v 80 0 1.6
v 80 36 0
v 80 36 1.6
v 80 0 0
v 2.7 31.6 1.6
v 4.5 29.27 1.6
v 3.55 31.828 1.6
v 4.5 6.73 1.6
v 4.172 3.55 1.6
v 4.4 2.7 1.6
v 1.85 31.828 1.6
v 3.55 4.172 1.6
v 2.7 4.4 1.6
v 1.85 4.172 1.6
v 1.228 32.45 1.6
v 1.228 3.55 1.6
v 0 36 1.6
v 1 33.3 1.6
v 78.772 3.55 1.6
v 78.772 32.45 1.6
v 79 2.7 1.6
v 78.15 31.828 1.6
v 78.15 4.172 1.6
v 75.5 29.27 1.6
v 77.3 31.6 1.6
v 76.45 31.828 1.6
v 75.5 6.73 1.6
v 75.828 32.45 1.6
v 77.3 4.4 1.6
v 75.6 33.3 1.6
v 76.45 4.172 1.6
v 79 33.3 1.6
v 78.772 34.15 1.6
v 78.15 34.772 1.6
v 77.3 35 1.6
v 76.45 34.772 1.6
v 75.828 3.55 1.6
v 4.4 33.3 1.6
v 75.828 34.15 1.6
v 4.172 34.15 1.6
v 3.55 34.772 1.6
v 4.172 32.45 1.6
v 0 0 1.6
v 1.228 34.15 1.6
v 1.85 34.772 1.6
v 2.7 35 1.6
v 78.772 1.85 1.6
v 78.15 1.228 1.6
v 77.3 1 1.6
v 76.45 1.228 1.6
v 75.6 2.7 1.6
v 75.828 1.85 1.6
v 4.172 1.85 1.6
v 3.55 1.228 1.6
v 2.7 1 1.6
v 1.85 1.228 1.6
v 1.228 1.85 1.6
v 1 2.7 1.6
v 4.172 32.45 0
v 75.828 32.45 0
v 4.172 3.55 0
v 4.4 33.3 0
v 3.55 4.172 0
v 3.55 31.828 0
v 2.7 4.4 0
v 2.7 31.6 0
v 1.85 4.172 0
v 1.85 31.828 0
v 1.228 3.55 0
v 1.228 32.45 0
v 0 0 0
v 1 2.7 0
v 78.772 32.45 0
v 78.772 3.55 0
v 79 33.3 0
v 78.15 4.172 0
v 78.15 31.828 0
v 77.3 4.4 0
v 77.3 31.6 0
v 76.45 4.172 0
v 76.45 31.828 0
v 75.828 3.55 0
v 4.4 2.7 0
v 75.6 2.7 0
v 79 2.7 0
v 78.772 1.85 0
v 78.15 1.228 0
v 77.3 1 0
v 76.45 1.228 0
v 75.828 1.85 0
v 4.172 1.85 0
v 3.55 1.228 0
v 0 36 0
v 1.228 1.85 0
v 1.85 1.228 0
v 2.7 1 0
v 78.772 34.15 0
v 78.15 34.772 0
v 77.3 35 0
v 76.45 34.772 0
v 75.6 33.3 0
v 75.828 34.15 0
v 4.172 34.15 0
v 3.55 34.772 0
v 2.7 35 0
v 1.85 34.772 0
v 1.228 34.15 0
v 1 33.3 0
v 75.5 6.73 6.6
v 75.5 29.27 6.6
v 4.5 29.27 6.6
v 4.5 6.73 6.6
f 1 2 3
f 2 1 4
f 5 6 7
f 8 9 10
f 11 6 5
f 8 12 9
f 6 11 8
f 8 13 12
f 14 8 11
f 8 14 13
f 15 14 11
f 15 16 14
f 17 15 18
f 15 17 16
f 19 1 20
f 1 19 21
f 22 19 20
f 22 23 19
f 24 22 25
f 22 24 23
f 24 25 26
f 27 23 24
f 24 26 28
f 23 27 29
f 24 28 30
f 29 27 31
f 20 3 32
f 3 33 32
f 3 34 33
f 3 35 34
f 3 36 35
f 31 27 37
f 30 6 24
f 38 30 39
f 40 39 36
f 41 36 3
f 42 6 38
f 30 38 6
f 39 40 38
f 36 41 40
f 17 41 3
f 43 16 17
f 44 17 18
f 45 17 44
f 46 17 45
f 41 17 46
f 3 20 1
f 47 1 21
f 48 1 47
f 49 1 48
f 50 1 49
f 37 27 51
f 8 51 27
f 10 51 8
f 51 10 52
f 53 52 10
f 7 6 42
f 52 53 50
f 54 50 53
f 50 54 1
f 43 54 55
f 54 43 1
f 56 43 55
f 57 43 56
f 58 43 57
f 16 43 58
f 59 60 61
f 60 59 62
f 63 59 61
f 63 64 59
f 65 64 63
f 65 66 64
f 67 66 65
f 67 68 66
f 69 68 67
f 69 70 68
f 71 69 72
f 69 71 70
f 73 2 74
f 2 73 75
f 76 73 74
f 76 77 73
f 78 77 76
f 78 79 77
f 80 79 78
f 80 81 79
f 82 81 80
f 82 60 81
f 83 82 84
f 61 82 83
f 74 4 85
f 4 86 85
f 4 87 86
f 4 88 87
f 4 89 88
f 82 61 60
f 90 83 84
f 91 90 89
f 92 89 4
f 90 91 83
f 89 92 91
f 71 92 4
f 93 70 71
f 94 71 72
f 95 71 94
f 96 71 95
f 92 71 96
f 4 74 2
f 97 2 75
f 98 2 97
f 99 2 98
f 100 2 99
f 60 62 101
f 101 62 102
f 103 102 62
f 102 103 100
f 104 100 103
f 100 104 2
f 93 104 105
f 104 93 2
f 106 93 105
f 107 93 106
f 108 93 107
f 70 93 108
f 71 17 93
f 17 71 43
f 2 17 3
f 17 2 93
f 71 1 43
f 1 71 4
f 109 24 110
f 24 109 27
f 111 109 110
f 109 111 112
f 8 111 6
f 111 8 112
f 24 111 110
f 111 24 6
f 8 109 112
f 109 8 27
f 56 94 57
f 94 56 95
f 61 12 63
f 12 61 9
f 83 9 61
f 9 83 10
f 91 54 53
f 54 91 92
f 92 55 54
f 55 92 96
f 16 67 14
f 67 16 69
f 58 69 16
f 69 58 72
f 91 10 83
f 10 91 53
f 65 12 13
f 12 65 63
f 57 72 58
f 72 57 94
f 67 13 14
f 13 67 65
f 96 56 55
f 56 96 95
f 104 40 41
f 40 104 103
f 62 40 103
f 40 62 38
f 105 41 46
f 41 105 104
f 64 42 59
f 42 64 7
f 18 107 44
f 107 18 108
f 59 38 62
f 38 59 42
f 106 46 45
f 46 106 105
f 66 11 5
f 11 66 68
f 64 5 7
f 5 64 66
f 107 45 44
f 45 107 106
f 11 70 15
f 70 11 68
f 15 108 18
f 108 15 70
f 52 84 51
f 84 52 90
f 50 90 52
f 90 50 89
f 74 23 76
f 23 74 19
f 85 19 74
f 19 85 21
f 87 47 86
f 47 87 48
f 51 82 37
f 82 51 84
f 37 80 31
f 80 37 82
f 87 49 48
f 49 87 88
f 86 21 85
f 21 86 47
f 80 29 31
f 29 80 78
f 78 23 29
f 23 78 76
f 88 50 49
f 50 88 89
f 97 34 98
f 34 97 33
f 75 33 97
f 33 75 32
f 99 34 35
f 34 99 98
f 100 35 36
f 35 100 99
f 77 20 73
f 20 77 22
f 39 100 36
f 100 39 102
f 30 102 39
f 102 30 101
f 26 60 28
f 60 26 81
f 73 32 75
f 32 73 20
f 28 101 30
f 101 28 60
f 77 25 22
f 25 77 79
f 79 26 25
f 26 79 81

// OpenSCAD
// http://blog.think3dprint3d.com/2014/04/OpenSCAD-PanelOne-case-design.html
// http://forum.reprapdiscount.com/threads/using-openscad-to-design-a-basic-lcd-enclosure.1471/

//LCD screen
module  ULN2003() {

//LCD screen
lcd_scrn_x=71;
lcd_scrn_y=22.54;
lcd_scrn_z=5;

lcd_board_x=80;
lcd_board_y=36;
lcd_board_z=1.6; //does not include metal tabs on base

lcd_hole_d=3.4;
lcd_hole_offset=(lcd_hole_d/2)+1;
//board edge to center of first connector hole
lcd_connect_x=10.2;
lcd_connect_y=58.4;
    
difference(){
    union(){
        color("OliveDrab")
        translate([0,0,0])
        cube([lcd_board_x,lcd_board_y,lcd_board_z]);

        color("DarkSlateGray")
        translate([(lcd_board_x-lcd_scrn_x)/2,(lcd_board_y-lcd_scrn_y)/2,lcd_board_z])
        cube([lcd_scrn_x,lcd_scrn_y,lcd_scrn_z]);

        color("darkRed")
        translate([(lcd_board_x-lcd_scrn_x)/2,(lcd_board_y-lcd_scrn_y)/2,lcd_board_z])
        cube([lcd_scrn_x,lcd_scrn_y,lcd_scrn_z]);
    }

    for(i=[lcd_hole_offset,lcd_board_x-lcd_hole_offset]){
        for(j=[lcd_hole_offset,lcd_board_y-lcd_hole_offset]){
            translate([i,j,lcd_board_z])
            cylinder(r=lcd_hole_d/2,h=lcd_board_z+3,$fn=12,center=true);
        }
    }
}
}

ULN2003();
